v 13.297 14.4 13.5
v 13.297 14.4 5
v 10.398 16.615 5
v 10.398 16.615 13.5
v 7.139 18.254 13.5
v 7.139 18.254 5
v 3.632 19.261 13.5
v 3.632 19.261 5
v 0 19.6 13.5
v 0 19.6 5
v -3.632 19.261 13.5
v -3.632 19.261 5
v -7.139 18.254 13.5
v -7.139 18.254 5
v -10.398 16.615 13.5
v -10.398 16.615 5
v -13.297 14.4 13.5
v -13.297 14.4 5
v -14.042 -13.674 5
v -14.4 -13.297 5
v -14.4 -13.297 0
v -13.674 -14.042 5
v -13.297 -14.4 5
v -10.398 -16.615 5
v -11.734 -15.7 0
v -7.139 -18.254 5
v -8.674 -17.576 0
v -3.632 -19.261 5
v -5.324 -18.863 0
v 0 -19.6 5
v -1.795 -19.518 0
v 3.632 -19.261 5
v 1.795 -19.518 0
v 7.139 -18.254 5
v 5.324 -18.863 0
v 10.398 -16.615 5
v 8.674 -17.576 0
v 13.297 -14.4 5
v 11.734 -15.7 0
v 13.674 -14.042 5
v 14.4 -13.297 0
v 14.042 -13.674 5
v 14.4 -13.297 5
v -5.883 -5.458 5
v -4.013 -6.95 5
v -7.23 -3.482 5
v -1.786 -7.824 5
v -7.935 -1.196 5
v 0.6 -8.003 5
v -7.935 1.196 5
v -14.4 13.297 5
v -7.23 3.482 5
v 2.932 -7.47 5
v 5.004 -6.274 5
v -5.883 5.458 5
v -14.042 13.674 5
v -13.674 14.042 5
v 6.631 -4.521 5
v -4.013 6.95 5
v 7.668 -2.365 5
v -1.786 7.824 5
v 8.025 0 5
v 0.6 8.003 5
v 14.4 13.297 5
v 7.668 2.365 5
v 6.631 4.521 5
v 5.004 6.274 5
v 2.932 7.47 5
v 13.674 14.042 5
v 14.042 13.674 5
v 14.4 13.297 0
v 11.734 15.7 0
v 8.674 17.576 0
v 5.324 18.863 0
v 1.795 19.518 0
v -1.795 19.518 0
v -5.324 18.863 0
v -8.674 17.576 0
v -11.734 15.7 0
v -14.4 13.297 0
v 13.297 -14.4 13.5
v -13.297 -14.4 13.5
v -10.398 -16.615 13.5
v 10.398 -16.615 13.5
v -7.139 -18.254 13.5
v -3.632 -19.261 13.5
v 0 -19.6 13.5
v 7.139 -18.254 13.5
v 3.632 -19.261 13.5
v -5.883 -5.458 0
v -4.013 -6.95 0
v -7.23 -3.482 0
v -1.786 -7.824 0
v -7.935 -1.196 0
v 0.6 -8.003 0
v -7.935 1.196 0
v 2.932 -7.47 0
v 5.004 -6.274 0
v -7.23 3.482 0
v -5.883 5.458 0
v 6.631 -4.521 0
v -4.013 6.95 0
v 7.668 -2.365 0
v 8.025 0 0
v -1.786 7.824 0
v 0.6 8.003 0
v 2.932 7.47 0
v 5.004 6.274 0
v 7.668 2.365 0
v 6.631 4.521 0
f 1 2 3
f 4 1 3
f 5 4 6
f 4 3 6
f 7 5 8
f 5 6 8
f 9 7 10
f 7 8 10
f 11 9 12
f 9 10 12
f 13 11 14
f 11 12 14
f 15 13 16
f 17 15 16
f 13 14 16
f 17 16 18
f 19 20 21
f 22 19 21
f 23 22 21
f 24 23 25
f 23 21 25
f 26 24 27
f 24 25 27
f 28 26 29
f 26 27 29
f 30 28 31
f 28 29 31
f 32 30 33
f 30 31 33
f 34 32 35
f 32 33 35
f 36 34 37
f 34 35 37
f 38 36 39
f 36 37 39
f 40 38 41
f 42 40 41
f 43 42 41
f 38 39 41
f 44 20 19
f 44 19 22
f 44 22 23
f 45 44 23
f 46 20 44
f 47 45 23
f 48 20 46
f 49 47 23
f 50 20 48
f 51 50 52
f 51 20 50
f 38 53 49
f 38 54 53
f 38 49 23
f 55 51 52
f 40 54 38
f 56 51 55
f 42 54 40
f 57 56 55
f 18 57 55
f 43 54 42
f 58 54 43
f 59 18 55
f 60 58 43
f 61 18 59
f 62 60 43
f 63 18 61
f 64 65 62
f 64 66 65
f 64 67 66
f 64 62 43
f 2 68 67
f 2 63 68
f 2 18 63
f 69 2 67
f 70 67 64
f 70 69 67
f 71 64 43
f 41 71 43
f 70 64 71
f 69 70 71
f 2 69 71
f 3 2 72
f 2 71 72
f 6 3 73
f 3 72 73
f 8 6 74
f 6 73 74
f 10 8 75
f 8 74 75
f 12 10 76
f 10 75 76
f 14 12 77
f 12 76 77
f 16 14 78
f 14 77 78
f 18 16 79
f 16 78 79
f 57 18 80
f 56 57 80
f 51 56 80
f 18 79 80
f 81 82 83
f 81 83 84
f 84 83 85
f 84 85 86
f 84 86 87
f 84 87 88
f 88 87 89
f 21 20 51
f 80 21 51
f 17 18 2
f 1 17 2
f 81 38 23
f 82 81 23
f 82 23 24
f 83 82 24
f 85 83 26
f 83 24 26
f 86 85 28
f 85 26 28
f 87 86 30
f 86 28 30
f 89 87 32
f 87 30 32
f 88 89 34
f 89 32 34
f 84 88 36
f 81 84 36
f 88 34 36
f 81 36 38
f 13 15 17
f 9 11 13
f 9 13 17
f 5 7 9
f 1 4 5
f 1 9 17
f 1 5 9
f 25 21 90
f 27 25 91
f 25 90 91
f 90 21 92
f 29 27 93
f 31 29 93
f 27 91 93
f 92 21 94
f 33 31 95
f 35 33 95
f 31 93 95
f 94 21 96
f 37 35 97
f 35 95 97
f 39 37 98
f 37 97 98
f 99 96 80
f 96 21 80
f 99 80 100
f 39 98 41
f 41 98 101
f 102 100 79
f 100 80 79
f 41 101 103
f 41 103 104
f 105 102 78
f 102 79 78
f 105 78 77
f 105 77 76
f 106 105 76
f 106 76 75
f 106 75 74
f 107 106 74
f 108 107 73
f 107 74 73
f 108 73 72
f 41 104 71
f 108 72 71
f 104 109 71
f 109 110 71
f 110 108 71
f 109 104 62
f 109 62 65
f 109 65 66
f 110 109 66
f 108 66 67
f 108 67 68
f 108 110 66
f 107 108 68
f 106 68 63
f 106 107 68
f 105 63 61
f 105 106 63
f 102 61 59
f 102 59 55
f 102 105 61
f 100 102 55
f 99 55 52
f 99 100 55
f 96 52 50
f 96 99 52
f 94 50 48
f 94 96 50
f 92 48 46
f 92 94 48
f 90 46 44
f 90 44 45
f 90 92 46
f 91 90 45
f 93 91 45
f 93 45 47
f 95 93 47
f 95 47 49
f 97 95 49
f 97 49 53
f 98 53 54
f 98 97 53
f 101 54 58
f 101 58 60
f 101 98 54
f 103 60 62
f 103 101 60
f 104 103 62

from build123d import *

# Parameters (mm, degrees)
F0_R     = 19.6
F0_R_2   = 8.025
F1_DEPTH = 5
F3_DEPTH = 8.5
F4_DEPTH = 5.001


with BuildPart() as f1:
    # F0 (on Top) → F1 (new body)
    with BuildSketch(Plane.XY):
        Circle(F0_R)
        Circle(F0_R_2, mode=Mode.SUBTRACT)
    extrude(amount=F1_DEPTH)

    # F2 (on face) → F3 (join)
    with BuildSketch(Plane.XY.offset(5)):
        with BuildLine():
            ThreePointArc((-13.2966161109, -14.4), (0, -19.6), (13.2966161109, -14.4))
            Line((13.2966161109, -14.4), (-13.2966161109, -14.4))
        make_face()
        with BuildLine():
            Line((-13.2966161109, 14.4), (13.2966161109, 14.4))
            ThreePointArc((13.2966161109, 14.4), (0, 19.6), (-13.2966161109, 14.4))
        make_face()
    extrude(amount=F3_DEPTH)

    # F2 (on face) → F4 (cut, through all)
    with BuildSketch(Plane.XY.offset(5)):
        with BuildLine():
            ThreePointArc((-14.4, 13.2966161109), (-19.6, 0), (-14.4, -13.2966161109))
            Line((-14.4, -13.2966161109), (-14.4, 13.2966161109))
        make_face()
        with BuildLine():
            Line((14.4, 13.2966161109), (14.4, -13.2966161109))
            ThreePointArc((14.4, -13.2966161109), (18.2537667346, -7.138627319), (19.6, 0))
            ThreePointArc((19.6, 0), (18.2537667346, 7.138627319), (14.4, 13.2966161109))
        make_face()
    extrude(amount=-F4_DEPTH, mode=Mode.SUBTRACT)


solid = f1.part
